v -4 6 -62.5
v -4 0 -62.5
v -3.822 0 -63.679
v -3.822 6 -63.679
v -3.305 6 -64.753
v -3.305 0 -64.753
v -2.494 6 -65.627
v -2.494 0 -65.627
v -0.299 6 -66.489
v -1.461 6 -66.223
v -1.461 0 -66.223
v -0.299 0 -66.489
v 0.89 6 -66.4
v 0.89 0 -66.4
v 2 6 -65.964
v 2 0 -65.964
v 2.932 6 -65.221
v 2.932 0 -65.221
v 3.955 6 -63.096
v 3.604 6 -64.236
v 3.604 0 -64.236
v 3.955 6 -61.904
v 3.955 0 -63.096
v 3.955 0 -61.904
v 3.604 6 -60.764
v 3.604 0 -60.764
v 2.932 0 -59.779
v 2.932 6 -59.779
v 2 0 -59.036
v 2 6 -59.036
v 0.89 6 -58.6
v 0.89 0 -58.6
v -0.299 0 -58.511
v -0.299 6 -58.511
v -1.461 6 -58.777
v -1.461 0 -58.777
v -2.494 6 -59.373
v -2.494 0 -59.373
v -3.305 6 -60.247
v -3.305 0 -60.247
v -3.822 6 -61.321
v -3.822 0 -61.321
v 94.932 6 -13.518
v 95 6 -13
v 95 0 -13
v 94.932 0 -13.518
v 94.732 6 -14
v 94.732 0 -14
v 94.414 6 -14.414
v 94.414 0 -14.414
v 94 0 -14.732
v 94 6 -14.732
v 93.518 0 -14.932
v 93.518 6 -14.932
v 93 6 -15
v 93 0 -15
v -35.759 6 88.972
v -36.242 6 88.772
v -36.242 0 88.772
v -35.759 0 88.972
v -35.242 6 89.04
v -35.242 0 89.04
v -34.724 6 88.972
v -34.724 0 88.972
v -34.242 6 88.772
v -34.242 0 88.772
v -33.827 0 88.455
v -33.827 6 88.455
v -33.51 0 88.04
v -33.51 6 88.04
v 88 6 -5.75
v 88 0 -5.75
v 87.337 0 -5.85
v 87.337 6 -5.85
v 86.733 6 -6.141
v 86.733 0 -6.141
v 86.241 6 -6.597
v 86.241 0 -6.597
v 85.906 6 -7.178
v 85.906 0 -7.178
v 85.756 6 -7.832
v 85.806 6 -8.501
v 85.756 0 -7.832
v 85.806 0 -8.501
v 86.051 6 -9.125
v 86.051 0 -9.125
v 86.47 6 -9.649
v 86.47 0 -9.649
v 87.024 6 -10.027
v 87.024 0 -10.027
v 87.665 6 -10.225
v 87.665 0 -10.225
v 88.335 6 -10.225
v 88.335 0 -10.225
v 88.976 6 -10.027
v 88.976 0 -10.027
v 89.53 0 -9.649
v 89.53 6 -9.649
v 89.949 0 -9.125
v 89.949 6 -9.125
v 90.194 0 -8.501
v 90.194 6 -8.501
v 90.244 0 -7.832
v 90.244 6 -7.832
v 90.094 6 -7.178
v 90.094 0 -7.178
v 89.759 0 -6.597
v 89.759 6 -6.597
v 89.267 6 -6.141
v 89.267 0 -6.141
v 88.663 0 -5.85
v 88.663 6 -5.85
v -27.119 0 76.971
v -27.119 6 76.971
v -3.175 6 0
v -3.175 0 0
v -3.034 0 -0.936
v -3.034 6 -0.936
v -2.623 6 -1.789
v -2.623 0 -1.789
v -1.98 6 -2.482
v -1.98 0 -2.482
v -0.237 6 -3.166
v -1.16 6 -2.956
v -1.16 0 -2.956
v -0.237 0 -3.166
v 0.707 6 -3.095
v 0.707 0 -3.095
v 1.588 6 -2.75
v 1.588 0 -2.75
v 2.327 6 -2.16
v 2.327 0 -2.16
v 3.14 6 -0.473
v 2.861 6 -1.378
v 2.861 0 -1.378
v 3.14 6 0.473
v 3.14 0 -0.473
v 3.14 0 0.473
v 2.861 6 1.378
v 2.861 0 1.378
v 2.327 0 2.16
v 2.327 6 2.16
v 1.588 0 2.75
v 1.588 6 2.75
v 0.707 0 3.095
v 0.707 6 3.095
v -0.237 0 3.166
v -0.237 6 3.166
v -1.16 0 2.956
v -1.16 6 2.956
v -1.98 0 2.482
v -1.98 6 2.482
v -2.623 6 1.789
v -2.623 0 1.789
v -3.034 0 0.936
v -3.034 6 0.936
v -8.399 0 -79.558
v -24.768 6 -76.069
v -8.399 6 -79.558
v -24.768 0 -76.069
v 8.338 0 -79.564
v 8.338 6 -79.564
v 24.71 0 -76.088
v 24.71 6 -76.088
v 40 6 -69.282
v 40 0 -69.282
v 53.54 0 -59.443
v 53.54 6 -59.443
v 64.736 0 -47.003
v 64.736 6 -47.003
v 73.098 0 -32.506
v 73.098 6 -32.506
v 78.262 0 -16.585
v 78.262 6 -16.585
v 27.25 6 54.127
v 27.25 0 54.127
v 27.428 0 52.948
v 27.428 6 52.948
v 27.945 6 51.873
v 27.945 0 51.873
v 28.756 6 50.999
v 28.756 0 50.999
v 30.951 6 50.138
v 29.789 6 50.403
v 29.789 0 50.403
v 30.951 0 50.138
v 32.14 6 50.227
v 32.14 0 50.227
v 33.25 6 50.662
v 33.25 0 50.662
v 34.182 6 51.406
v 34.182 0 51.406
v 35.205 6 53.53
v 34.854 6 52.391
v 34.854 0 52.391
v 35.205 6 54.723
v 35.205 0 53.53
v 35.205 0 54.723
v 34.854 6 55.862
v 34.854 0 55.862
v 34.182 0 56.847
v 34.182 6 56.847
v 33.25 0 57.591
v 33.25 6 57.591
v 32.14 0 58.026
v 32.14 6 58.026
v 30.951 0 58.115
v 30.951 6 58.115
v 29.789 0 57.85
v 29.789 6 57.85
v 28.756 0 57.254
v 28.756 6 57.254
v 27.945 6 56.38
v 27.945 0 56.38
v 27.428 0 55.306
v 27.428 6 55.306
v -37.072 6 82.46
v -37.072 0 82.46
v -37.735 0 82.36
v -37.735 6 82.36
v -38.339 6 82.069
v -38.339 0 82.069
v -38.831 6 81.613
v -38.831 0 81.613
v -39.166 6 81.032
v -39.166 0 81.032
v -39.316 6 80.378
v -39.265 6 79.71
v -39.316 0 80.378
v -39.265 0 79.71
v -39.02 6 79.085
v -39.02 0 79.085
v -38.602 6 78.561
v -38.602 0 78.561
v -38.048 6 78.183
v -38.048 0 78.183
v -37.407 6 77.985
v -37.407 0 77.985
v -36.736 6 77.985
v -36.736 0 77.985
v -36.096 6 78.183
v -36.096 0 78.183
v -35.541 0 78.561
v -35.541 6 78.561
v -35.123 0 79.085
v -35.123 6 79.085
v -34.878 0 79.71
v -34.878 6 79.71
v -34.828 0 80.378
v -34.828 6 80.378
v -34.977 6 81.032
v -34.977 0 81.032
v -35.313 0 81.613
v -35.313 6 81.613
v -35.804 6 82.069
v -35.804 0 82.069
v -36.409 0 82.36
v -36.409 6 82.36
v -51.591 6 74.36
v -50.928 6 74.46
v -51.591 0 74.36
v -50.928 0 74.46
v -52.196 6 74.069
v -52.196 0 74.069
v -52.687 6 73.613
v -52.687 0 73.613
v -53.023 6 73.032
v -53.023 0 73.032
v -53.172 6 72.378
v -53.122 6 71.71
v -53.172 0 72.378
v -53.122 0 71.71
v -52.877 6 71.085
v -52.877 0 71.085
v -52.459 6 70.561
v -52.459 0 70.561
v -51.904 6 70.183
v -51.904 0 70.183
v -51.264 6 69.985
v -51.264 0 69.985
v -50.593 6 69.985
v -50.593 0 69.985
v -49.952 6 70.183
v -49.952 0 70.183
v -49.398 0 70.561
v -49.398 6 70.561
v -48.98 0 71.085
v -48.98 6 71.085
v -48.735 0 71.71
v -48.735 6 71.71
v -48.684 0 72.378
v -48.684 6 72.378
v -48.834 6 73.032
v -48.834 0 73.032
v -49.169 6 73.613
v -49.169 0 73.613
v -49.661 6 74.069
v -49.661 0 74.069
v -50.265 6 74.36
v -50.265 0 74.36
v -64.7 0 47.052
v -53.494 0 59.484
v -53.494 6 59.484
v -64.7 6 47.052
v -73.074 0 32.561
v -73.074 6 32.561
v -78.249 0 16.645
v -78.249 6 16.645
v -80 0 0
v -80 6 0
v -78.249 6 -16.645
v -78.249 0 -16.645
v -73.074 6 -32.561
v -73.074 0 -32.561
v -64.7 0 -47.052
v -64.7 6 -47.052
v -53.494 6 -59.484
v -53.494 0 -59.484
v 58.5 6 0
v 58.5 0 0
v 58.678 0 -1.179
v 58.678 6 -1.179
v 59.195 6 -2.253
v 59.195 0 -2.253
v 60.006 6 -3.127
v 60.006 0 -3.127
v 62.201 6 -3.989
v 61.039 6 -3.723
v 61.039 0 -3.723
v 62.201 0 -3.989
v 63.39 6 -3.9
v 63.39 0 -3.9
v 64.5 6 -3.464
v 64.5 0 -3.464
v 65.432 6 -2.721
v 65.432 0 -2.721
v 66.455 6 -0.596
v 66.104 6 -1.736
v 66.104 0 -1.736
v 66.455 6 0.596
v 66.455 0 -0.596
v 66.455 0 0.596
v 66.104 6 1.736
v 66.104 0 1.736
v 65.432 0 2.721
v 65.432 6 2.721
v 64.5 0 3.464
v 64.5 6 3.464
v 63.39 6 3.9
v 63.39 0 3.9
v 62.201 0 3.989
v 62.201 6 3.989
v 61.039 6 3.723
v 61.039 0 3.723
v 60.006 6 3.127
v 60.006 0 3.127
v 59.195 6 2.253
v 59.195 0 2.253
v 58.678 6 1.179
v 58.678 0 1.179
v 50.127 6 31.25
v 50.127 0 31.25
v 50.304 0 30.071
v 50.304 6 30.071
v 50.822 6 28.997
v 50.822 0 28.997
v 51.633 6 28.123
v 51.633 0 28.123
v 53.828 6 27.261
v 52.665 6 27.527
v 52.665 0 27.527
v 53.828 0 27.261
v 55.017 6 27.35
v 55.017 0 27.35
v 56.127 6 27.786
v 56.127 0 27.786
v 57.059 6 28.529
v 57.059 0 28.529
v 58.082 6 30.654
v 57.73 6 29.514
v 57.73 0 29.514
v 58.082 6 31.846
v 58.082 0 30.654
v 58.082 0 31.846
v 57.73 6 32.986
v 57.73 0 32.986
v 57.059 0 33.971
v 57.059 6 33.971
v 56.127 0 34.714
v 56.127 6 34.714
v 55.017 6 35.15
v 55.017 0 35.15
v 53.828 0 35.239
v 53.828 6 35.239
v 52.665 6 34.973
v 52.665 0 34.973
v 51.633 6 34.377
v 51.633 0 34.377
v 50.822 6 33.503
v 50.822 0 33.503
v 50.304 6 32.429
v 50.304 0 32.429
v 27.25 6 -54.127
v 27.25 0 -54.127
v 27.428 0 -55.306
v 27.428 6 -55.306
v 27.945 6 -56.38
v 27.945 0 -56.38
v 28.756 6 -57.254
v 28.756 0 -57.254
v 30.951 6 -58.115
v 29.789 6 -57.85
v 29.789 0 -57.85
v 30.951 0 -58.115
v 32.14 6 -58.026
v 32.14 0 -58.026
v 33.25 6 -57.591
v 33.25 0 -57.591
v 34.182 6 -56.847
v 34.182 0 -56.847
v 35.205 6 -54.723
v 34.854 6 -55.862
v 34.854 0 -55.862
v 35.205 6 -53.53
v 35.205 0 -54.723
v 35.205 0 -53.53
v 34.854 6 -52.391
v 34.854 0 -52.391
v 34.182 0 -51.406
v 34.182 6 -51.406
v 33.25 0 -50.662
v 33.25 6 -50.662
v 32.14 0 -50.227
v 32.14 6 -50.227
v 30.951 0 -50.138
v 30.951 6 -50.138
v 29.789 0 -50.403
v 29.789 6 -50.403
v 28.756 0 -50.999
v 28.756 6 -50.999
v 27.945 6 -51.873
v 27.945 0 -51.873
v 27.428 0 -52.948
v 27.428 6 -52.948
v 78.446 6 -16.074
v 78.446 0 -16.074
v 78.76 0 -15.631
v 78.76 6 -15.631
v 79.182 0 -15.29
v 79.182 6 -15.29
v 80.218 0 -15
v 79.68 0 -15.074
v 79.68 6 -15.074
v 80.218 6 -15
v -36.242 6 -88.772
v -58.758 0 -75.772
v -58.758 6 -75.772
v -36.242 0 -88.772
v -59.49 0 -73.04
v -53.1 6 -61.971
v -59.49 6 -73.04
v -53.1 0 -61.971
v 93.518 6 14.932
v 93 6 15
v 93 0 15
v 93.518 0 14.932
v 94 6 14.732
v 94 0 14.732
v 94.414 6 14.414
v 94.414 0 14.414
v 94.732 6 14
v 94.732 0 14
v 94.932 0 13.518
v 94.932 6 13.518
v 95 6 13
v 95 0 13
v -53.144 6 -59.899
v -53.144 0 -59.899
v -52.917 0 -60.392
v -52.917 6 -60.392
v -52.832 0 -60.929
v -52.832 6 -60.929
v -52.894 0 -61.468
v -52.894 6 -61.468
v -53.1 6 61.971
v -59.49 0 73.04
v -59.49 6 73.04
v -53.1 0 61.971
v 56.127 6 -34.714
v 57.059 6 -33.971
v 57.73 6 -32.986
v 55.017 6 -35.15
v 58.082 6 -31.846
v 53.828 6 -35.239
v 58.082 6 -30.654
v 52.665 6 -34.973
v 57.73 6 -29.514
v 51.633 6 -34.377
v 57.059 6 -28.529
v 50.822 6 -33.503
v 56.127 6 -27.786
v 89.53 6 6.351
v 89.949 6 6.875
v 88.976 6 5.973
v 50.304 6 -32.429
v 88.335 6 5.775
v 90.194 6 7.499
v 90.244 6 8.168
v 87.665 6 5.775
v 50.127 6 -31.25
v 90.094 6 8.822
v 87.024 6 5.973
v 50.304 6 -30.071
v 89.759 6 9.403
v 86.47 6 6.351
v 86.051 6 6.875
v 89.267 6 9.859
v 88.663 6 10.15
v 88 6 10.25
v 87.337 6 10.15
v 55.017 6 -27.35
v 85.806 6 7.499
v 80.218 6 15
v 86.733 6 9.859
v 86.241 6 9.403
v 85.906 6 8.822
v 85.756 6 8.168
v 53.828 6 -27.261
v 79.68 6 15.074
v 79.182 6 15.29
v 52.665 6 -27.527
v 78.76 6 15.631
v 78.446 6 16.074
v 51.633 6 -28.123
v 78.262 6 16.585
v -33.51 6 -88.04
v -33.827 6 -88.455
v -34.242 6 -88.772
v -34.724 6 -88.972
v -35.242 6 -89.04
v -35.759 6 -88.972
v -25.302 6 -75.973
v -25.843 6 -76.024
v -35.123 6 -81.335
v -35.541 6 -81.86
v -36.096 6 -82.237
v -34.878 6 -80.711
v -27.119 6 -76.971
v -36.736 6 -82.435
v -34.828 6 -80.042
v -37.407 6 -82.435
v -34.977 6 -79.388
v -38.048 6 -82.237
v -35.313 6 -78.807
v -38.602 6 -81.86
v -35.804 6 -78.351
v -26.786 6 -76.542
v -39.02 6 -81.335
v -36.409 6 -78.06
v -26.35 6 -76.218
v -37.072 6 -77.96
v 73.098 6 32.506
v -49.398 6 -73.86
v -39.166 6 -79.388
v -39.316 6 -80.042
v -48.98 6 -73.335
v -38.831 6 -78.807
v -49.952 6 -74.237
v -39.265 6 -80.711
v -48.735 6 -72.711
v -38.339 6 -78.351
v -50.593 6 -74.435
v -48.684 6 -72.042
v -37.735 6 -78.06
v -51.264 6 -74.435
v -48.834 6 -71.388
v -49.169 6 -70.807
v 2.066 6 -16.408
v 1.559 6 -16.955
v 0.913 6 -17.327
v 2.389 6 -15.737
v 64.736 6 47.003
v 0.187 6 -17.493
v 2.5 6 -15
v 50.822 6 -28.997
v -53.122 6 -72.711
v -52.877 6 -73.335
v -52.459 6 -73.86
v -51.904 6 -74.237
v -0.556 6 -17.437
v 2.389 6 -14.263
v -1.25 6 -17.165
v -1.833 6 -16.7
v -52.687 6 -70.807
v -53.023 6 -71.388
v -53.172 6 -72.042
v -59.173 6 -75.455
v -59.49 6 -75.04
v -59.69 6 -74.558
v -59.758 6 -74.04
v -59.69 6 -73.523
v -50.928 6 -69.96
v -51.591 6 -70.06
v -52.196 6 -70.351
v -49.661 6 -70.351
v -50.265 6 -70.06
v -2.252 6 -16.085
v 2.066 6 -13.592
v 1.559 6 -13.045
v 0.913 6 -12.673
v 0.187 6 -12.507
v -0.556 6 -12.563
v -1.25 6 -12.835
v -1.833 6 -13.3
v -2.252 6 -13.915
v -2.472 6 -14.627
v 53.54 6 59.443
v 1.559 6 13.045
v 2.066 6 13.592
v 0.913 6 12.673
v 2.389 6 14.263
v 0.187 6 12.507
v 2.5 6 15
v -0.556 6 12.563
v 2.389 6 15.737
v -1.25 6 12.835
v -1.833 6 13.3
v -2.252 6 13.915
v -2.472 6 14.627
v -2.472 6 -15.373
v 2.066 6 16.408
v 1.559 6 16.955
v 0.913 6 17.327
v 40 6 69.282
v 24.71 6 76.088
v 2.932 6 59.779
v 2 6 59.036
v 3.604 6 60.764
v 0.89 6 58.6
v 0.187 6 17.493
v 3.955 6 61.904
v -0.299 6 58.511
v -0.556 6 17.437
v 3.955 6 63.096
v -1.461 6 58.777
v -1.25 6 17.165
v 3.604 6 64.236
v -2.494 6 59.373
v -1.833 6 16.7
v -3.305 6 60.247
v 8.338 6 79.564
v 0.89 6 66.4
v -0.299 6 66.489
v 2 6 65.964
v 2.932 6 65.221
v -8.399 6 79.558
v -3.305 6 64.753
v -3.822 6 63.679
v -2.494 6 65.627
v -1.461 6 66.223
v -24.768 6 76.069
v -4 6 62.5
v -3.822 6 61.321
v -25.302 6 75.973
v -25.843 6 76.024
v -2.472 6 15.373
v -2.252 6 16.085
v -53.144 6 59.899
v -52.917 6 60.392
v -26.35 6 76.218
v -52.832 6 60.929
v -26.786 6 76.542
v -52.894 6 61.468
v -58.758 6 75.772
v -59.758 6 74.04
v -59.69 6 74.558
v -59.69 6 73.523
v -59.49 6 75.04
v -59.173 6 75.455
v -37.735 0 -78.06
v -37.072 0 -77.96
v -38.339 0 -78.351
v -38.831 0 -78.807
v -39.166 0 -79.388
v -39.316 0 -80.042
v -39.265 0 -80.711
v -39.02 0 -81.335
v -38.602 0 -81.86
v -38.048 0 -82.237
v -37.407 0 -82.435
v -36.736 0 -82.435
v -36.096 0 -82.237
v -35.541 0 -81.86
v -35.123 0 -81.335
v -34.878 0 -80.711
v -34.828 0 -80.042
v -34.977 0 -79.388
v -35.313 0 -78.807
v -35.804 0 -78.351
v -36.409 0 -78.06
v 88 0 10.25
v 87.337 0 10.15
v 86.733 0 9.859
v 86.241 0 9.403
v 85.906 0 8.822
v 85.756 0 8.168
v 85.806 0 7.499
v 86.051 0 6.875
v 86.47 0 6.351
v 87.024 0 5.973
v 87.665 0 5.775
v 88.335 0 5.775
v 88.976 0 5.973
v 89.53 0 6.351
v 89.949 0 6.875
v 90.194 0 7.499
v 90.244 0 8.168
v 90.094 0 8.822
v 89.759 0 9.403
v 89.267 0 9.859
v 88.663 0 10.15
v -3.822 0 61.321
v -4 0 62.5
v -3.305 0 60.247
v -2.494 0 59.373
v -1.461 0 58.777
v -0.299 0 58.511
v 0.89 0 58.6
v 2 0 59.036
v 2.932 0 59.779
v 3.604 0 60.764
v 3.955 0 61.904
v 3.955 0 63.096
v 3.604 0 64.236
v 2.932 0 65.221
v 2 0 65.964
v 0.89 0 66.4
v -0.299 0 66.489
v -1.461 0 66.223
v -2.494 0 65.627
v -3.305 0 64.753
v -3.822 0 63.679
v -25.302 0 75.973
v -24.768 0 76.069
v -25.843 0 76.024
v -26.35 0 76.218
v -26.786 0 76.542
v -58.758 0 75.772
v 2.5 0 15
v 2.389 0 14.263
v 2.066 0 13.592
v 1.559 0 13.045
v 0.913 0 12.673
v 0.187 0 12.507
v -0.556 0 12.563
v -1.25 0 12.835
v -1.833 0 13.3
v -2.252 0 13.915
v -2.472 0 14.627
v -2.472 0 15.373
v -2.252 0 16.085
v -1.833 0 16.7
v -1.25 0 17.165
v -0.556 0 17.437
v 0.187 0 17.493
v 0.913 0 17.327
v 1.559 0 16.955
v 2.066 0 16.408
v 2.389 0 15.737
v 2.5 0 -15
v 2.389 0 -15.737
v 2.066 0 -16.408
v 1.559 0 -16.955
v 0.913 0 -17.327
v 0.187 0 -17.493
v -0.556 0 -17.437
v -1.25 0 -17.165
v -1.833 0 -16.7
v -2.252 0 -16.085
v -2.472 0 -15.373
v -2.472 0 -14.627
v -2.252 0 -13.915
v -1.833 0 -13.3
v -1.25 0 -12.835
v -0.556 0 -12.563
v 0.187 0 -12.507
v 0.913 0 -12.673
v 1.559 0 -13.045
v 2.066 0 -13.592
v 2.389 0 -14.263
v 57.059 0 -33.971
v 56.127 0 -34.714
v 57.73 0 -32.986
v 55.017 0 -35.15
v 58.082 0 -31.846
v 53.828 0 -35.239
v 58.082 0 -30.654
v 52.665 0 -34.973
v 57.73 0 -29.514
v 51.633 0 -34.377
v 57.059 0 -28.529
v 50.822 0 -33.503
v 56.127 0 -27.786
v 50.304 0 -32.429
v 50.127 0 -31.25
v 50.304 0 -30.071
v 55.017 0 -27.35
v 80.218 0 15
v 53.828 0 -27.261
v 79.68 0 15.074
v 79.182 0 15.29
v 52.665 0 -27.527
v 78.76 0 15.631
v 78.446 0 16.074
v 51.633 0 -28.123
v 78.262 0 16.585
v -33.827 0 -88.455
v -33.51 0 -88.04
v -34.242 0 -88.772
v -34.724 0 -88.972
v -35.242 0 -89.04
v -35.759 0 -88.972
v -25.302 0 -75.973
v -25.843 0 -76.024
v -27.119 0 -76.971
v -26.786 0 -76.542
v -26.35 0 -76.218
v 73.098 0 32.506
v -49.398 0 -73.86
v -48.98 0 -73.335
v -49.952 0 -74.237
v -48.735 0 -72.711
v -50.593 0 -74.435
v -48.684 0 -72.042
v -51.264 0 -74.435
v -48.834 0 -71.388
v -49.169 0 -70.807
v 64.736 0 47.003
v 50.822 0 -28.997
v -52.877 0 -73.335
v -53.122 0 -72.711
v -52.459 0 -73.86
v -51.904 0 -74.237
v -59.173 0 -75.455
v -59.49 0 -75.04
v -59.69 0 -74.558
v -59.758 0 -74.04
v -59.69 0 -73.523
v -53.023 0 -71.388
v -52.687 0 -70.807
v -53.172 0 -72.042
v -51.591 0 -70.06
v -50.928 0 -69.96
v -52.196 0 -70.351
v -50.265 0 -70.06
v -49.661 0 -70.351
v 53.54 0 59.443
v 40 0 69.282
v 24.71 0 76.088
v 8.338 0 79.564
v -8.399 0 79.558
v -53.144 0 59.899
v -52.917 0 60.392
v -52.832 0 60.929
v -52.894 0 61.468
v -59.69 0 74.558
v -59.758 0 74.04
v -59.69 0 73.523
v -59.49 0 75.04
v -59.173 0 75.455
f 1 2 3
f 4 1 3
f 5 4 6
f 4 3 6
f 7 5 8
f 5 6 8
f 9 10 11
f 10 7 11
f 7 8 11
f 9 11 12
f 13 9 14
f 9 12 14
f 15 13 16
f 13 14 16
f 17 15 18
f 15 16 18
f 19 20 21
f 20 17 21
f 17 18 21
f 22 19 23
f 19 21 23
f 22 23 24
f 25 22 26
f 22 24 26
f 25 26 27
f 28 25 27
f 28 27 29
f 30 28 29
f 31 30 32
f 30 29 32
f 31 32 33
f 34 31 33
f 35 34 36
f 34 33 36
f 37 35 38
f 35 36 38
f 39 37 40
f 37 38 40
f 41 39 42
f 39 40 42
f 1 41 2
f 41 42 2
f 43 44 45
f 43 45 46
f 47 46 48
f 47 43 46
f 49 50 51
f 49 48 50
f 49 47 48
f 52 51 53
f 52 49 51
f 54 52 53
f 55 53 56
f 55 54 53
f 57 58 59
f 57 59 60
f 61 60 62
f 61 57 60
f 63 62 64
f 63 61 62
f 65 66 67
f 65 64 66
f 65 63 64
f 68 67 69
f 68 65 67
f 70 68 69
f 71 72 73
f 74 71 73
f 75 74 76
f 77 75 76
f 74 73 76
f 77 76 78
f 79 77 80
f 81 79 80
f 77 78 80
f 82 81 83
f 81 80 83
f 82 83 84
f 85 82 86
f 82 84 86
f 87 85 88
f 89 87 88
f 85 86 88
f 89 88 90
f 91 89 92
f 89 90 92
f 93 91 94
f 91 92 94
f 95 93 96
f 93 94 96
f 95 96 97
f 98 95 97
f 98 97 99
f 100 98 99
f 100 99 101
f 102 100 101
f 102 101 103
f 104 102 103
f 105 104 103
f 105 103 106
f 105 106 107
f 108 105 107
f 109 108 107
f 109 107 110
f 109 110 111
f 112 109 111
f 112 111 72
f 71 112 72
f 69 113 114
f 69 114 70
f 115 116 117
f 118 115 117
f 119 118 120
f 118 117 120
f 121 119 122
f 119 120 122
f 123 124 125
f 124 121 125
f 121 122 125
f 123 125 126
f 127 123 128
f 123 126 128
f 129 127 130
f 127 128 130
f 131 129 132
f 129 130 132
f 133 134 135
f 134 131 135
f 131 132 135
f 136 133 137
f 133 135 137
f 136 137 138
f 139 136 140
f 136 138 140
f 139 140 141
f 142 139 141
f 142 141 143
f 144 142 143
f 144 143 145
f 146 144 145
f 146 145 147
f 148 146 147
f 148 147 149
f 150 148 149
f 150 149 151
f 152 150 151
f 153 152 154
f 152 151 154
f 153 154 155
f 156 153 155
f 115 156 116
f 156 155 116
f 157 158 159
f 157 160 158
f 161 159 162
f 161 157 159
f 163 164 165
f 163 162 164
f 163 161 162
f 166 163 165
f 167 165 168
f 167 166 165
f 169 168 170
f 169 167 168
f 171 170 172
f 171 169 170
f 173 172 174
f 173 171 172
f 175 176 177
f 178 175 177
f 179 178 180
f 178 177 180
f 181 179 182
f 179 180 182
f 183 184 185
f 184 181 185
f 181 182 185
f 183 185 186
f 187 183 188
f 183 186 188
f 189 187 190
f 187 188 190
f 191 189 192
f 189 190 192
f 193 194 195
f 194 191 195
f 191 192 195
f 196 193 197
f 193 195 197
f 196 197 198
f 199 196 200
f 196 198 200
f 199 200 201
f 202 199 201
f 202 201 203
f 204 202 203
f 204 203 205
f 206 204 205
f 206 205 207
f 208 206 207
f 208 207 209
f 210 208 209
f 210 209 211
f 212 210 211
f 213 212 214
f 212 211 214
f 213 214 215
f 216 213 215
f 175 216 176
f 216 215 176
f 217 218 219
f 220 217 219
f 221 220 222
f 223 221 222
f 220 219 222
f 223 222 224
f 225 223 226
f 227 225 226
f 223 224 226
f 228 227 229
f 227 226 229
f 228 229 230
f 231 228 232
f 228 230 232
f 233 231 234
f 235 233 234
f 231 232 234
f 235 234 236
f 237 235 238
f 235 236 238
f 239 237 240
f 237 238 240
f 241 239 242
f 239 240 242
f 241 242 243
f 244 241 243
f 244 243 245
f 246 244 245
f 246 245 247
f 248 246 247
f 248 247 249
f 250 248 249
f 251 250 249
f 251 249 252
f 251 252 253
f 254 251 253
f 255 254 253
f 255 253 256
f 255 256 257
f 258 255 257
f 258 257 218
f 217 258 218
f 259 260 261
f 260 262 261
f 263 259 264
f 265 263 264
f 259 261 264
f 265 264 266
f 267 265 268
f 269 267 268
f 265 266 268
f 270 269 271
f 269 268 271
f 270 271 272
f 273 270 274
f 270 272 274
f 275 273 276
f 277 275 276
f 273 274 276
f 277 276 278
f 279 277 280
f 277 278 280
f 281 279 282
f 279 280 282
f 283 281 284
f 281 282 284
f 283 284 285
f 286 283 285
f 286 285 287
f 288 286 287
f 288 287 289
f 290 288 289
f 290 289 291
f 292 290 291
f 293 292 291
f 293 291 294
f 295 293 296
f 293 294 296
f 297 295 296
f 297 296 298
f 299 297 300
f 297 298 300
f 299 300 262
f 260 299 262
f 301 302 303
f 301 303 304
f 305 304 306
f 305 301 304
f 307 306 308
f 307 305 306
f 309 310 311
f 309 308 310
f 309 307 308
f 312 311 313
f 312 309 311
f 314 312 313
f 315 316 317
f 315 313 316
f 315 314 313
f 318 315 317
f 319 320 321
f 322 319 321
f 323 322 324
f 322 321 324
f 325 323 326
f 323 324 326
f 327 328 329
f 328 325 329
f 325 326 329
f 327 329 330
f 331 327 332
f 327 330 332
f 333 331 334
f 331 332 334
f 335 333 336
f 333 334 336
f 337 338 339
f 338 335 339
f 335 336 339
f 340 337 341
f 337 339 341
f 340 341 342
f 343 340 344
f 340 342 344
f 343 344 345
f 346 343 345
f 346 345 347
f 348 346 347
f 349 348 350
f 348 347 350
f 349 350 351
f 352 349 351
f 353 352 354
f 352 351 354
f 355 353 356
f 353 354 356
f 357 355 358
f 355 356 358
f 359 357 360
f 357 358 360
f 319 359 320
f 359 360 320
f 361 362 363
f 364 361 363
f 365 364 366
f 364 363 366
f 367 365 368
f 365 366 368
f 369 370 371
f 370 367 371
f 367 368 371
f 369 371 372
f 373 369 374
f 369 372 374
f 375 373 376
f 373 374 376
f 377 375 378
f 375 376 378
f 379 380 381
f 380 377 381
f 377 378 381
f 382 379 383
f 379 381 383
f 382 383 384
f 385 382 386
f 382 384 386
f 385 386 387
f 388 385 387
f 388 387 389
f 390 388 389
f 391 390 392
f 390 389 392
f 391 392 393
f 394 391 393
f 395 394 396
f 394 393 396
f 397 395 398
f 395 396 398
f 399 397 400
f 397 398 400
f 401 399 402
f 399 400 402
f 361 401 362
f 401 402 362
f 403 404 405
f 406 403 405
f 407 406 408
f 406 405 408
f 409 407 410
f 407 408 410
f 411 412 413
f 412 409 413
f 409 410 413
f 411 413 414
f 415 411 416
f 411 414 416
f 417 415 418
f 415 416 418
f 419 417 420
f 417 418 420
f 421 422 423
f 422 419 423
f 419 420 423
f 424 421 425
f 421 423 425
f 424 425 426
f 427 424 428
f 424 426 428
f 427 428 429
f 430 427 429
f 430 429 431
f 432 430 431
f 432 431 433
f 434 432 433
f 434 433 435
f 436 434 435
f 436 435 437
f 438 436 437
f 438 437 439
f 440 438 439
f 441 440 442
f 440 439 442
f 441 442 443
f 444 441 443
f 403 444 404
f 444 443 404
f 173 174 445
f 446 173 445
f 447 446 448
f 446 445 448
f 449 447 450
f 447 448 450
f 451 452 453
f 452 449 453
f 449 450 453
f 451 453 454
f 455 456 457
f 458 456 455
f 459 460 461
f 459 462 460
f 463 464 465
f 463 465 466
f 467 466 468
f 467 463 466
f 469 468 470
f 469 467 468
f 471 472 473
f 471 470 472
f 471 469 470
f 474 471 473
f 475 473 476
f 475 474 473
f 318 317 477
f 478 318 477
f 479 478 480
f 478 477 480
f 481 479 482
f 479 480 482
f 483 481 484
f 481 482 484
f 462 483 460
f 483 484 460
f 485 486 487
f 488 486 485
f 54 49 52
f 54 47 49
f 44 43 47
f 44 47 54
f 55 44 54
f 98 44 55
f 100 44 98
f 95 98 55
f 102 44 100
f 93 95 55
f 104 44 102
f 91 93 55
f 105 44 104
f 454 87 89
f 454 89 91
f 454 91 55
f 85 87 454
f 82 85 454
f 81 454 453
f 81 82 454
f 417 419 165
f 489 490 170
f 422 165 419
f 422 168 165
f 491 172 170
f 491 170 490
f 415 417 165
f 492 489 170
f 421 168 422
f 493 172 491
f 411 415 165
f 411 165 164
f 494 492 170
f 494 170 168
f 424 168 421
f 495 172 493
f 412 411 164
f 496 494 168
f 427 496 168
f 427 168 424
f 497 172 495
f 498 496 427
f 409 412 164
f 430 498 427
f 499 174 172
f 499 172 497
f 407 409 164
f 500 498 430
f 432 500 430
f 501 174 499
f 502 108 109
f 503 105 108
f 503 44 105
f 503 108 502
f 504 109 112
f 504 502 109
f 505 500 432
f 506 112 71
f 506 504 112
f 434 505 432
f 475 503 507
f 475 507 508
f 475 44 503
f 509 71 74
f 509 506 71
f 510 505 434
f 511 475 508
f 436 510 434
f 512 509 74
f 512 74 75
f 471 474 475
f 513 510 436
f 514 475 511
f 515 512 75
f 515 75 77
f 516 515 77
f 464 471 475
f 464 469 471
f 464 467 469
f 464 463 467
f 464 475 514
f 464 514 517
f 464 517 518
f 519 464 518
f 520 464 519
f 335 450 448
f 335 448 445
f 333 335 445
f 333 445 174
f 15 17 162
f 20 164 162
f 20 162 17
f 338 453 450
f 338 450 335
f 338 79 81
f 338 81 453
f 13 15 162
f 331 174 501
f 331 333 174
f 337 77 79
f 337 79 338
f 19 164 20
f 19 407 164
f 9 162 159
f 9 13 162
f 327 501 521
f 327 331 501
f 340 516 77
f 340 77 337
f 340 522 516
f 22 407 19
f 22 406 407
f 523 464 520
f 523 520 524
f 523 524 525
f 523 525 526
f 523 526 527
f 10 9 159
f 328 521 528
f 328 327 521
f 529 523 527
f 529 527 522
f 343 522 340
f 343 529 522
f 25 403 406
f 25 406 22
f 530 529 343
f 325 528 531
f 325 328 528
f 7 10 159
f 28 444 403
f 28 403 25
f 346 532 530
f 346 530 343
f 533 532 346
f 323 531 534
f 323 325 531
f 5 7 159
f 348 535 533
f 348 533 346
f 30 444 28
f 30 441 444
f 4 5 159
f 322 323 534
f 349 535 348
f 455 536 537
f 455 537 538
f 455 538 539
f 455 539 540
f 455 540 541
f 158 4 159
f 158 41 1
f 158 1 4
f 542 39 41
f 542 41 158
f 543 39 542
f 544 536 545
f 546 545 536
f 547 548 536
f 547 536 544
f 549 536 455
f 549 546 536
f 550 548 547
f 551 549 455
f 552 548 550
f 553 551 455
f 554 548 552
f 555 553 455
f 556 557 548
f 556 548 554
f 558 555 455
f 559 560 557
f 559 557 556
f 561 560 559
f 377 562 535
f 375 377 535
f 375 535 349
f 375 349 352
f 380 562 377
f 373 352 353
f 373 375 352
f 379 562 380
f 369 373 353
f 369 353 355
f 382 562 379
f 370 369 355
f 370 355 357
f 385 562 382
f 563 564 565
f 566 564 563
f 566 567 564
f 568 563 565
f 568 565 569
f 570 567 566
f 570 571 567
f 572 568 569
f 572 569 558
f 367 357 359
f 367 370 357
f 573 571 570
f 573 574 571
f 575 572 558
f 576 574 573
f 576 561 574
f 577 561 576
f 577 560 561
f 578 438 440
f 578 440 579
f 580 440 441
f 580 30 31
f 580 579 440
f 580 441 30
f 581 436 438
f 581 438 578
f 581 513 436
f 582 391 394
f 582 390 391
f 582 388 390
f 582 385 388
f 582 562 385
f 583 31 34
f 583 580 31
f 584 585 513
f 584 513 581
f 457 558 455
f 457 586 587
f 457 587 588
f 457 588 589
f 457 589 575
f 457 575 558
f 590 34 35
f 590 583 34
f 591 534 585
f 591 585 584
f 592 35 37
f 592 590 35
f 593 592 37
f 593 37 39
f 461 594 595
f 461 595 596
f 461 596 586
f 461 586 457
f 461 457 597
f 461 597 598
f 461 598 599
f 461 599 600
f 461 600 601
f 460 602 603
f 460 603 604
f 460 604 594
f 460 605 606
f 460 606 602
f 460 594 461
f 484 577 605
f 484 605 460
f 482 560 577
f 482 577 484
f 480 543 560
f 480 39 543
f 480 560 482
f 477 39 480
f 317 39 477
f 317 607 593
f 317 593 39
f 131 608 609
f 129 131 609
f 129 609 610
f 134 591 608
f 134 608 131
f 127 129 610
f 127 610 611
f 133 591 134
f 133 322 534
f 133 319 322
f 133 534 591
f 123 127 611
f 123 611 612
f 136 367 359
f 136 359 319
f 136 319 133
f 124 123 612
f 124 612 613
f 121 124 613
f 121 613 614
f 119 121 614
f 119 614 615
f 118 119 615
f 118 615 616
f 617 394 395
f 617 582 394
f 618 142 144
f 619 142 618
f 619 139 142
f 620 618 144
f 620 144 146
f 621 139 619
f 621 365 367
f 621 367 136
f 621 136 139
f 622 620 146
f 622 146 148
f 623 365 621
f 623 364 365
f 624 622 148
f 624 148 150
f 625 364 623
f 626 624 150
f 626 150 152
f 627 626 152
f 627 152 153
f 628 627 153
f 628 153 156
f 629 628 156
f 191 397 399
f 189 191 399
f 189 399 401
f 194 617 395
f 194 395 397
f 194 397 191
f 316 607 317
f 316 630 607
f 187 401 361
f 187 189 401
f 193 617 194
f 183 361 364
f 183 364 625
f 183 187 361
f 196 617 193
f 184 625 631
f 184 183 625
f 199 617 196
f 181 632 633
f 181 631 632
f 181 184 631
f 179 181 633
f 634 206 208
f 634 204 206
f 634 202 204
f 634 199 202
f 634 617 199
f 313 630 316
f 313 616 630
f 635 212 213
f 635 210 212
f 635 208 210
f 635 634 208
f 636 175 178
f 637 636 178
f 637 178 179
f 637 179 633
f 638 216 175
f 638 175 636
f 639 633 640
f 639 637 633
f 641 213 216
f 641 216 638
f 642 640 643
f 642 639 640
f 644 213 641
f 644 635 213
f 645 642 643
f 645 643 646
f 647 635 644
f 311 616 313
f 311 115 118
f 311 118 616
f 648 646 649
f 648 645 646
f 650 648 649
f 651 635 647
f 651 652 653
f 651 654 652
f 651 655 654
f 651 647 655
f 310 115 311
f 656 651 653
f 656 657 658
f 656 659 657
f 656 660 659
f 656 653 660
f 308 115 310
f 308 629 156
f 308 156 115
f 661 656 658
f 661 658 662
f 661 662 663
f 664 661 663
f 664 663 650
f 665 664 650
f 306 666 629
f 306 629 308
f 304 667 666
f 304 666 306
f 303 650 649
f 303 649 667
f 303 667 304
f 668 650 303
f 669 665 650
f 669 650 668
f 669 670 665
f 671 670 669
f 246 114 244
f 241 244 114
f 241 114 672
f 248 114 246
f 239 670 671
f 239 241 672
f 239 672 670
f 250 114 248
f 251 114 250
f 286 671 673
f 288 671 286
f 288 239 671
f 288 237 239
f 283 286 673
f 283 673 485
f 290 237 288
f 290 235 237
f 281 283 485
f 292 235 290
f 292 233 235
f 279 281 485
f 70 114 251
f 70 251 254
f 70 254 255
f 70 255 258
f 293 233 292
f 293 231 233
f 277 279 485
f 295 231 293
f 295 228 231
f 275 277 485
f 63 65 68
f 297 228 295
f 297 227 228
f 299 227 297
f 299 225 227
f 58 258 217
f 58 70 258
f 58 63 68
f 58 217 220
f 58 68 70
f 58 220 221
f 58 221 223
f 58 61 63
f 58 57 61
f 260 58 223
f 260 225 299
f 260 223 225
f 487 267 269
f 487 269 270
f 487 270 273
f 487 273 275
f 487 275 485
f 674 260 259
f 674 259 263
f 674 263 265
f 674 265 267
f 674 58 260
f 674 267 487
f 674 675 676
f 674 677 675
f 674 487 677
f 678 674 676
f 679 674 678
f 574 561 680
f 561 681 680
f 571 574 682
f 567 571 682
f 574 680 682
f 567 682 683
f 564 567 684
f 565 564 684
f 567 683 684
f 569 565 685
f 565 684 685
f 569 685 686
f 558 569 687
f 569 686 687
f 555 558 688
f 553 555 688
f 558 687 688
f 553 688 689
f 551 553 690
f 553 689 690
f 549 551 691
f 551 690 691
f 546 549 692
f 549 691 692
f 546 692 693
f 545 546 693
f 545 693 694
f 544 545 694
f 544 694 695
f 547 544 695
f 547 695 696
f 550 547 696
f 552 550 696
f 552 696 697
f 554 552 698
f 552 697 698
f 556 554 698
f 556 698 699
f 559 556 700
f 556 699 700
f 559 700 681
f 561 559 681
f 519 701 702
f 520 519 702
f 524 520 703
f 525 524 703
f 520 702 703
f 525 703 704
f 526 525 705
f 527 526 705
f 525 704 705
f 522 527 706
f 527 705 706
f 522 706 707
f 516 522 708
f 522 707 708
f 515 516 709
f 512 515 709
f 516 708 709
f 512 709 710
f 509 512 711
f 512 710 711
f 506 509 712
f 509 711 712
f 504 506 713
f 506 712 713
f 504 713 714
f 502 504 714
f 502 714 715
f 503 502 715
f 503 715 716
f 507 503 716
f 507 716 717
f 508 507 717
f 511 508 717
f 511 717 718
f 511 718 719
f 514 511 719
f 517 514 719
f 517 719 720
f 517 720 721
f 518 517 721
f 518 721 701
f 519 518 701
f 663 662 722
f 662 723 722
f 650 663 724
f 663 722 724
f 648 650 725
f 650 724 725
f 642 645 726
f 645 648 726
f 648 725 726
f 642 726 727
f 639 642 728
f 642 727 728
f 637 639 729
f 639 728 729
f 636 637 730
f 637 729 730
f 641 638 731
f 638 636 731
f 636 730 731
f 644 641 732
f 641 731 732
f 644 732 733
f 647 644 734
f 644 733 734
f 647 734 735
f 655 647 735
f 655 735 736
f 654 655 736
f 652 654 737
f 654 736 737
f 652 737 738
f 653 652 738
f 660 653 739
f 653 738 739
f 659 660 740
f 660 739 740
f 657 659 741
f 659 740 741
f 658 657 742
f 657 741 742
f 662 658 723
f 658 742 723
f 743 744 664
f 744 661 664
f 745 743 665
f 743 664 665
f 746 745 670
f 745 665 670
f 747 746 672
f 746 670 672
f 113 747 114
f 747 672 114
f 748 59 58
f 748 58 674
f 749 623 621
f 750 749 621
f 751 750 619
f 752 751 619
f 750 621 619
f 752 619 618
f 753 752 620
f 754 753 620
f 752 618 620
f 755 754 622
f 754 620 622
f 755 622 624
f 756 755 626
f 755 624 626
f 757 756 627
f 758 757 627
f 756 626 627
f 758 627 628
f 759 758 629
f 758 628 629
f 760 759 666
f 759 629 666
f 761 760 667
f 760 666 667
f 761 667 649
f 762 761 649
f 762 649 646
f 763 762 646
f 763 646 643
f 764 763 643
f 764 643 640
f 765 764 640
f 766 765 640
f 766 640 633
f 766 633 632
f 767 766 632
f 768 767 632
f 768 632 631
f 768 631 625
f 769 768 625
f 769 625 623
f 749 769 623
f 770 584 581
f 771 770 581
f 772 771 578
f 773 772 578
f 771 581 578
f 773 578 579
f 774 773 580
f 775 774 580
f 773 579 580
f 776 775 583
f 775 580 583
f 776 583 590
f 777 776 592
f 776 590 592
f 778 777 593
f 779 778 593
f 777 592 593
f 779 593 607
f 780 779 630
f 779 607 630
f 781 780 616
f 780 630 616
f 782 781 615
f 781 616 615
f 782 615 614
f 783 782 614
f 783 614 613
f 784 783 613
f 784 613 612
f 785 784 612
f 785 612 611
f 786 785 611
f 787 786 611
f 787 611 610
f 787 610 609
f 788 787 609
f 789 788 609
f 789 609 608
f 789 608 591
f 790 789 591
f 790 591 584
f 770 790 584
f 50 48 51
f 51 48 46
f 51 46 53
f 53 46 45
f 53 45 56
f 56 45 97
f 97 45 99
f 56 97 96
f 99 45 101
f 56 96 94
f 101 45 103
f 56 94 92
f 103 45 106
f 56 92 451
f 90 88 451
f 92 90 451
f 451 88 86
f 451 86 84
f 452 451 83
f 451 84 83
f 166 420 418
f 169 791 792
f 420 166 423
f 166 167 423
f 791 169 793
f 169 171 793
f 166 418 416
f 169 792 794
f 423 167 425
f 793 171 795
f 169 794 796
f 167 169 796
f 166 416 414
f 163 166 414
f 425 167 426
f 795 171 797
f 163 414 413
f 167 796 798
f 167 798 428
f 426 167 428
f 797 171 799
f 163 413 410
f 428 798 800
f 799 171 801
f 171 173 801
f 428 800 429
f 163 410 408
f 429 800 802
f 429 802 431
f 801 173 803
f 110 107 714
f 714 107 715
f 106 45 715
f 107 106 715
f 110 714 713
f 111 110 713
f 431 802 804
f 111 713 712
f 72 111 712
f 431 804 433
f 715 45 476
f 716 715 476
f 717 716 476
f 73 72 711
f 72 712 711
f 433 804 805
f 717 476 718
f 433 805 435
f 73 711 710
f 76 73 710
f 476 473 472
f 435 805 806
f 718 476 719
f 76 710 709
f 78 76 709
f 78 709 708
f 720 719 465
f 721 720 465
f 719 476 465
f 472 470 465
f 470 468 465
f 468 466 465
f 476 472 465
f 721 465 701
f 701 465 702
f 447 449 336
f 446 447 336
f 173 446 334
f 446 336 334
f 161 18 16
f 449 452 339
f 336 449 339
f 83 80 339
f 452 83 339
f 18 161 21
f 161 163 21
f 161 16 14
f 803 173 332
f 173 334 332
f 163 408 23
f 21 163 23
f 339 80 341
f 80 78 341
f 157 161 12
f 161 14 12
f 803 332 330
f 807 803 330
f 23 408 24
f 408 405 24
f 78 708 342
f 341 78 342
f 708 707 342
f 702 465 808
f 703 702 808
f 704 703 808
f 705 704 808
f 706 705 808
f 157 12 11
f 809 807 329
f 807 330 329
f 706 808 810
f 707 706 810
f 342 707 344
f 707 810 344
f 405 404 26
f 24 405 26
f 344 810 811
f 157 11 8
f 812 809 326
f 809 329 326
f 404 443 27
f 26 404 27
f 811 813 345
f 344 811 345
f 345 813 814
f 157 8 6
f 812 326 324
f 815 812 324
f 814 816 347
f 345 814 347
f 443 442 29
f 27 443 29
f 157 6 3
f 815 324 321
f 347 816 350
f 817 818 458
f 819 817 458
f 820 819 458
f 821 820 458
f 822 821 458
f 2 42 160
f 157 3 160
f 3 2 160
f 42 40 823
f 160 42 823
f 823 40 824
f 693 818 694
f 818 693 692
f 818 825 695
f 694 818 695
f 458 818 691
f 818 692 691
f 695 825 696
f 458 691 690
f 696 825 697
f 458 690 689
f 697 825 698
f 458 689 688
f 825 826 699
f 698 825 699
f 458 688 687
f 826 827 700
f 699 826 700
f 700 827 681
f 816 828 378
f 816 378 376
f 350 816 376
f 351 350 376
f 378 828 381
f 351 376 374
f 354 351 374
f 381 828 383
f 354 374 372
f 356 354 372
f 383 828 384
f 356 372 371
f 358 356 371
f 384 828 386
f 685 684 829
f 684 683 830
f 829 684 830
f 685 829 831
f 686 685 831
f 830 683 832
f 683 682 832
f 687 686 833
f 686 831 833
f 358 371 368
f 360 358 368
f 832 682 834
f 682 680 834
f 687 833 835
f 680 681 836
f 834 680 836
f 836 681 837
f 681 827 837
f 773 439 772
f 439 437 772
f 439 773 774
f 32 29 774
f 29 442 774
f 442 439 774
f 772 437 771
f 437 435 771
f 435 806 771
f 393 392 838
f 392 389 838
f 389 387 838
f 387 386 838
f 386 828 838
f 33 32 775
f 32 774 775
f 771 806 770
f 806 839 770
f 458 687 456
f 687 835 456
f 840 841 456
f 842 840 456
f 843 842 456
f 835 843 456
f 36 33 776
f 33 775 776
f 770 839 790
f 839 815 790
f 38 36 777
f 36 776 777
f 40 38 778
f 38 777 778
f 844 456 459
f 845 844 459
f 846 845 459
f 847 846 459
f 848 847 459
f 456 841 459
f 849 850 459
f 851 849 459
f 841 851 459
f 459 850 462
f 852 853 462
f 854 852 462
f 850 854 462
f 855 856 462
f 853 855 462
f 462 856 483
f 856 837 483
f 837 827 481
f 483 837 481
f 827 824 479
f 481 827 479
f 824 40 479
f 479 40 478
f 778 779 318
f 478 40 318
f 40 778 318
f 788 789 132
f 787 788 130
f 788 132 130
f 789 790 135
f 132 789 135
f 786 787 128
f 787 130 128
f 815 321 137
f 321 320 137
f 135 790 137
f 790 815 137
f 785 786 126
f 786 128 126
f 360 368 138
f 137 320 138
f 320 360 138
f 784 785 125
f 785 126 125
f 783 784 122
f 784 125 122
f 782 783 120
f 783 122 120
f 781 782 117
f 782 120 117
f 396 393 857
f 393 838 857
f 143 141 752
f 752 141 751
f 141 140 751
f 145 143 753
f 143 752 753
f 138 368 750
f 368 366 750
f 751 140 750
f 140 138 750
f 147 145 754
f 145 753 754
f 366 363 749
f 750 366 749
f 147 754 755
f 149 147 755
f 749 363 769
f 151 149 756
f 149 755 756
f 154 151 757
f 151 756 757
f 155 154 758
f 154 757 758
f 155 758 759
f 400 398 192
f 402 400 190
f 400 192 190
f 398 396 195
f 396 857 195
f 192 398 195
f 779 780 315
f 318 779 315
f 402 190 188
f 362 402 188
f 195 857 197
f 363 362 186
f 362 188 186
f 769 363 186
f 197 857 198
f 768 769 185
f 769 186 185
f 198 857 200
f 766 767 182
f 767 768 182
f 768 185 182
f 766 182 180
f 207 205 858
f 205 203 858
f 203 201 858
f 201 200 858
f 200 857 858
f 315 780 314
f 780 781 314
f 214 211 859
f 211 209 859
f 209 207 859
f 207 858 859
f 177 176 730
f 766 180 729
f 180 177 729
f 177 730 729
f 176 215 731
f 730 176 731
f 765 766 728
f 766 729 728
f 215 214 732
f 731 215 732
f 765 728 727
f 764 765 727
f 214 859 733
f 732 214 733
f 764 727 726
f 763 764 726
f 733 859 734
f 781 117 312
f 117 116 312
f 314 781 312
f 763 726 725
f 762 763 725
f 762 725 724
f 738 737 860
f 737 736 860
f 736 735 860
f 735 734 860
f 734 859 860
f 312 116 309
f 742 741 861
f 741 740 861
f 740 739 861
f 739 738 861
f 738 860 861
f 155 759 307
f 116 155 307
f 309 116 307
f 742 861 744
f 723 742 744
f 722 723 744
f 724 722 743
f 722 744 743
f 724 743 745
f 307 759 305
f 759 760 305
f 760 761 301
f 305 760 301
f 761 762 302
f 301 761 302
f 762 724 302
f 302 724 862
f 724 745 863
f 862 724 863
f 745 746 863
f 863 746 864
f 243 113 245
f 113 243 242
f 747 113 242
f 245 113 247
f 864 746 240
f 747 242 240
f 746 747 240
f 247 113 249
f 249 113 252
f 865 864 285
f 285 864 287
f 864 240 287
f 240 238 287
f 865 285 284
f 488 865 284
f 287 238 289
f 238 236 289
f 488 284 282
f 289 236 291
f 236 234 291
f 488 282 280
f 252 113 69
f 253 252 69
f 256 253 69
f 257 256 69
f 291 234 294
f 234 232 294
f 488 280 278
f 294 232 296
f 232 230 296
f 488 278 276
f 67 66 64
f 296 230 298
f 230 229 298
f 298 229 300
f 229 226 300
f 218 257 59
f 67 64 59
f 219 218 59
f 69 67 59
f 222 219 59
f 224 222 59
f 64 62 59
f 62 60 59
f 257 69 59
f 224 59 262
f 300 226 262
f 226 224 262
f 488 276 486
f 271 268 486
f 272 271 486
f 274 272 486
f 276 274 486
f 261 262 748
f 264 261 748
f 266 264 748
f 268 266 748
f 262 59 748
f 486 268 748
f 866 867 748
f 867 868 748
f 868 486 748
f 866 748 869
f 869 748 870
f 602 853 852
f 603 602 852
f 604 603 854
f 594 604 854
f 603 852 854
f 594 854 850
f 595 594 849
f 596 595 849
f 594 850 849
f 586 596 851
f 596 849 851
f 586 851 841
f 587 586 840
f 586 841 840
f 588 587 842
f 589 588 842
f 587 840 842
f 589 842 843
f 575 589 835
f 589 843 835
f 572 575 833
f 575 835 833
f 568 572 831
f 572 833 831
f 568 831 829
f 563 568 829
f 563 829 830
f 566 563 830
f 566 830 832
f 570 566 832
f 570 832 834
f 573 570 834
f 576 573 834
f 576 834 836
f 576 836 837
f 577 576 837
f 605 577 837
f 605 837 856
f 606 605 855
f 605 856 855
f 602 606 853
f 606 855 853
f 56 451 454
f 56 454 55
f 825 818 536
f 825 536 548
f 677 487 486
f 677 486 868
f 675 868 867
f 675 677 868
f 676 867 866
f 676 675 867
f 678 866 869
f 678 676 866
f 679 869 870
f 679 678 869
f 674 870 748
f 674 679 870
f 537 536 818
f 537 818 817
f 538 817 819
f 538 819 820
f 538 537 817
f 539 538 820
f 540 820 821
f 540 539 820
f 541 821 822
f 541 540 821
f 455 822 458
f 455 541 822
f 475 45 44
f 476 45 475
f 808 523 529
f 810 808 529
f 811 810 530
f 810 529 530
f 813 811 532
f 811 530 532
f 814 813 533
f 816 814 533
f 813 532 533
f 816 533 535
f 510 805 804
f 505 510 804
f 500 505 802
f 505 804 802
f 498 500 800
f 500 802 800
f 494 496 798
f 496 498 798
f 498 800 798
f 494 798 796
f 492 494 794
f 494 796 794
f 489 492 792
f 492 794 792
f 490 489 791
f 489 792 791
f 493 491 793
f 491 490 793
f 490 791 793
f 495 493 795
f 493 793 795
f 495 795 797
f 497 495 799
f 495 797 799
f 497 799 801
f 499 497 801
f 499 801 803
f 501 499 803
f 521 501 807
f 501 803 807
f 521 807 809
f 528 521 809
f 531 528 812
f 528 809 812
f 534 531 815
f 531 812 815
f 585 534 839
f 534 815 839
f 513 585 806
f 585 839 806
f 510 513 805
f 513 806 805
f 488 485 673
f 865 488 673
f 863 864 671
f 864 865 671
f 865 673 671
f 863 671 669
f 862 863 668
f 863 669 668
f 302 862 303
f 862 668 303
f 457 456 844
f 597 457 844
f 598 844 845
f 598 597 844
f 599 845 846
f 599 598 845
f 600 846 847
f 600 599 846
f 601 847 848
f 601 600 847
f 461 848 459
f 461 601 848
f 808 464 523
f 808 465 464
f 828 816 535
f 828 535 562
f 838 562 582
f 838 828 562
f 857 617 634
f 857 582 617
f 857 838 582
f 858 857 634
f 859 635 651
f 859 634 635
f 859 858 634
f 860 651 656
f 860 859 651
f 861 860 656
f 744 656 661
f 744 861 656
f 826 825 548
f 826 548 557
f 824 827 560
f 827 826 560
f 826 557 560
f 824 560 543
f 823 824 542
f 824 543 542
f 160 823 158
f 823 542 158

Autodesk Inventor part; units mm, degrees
ref_plane "YZ Plane" through (0, 0, 0) normal (1, 0, 0) x (0, 1, 0)
ref_plane "XZ Plane" through (0, 0, 0) normal (0, 1, 0) x (-1, 0, 0)
ref_plane "XY Plane" through (0, 0, 0) normal (0, 0, 1) x (1, 0, 0)
sketch "Sketch1" plane through (0, 0, 0) normal (0, 1, 0) x (-1, 0, 0)
  line L0 (0, 80) -> (0, 62.5) construction
  circle A0 centre (0, 62.5) radius 4
  line L1 (0, 62.5) -> (0, 0) construction
  circle A1 centre (-31.25, 54.1266) radius 4
  circle A2 centre (-54.1266, 31.25) radius 4
  circle A3 centre (-62.5, 0) radius 4
  circle A4 centre (-54.1266, -31.25) radius 4
  circle A5 centre (-31.25, -54.1266) radius 4
  circle A6 centre (0, -62.5) radius 4
  circle A7 centre (0, 0) radius 3.175
  line L2 (-78.5812, -15) -> (-95, -15)
  line L3 (-95, -15) -> (-95, 15)
  line L4 (-95, 15) -> (-78.5812, 15)
  line L5 (52.281, -60.5533) -> (60.4904, -74.7724)
  line L6 (60.4904, -74.7724) -> (34.5096, -89.7724)
  line L7 (34.5096, -89.7724) -> (26.3002, -75.5533)
  line L8 (26.3002, 75.5533) -> (34.5096, 89.7724)
  line L9 (34.5096, 89.7724) -> (60.4904, 74.7724)
  line L10 (60.4904, 74.7724) -> (52.281, 60.5533)
  arc A8 (52.281, -60.5533) -> (52.281, 60.5533) centre (0, 0) ccw
  arc A9 (26.3002, 75.5533) -> (-78.5812, 15) centre (0, 0) ccw
  arc A10 (-78.5812, -15) -> (26.3002, -75.5533) centre (0, 0) ccw
  point P0 (80, 0)
  dimension "d2" = 8
  dimension "d5" = 180
  dimension "d7" = 6.35
  dimension "d10" = 62.5
  dimension "d12" = 95
  dimension "d13" = 30
  dimension "d16" = 360
  dimension "d18" = 80
extrude "Extrusion1" add sketch "Sketch1" along normal blind 6
sketch "Sketch3" plane through (0, 6, 0) normal (0, 1, 0) x (1, 0, 0)
  line L0 (95, 15) -> (78.5812, 15) projected
  line L1 (78.5812, -15) -> (95, -15) projected
  line L2 (95, -15) -> (95, 15) projected
  point P0 (0, 0)
  point P1 (88, 8)
  point P2 (88, -8)
  point P3 (86.7906, -15)
  point P4 (-50.9282, 72.2102)
  point P5 (-37.0718, 80.2102)
  point P6 (-37.0718, -80.2102)
  point P7 (-50.9282, -72.2102)
  dimension "d19" = 7
  dimension "d20" = 7
  dimension "d21" = 7
  dimension "d24" = 360
hole "Hole1" at (88, 6, -8) at (88, 6, 8) at (-50.9282, 6, -72.2102) at (-37.0718, 6, -80.2102) at (-37.0718, 6, 80.2102) at (-50.9282, 6, 72.2102) direction (0, -1, 0) diameter 4.5 end through all clearance for "Flat Head Machine Screw" size "M4" standard "Ansi Metric M Profile"
sketch "Sketch4" plane through (0, 6, 0) normal (0, 1, 0) x (1, 0, 0)
  circle A0 centre (0, 15) radius 2.5
  circle A1 centre (0, -15) radius 2.5
  circle A2 centre (0, 0) radius 3.175 construction
  line L0 (0, 0) -> (8.7984, 0) construction
  dimension "d33" = 5
  dimension "d34" = 15
extrude "Extrusion2" cut sketch "Sketch4" against normal blind 6
fillet "Fillet1" radius 2 12 edges at (-52.281, 3, 60.5533) (-60.4904, 3, 74.7724) (-34.5096, 3, 89.7724) (-26.3002, 3, 75.5533) (78.5812, 3, 15) (95, 3, 15) (95, 3, -15) (78.5812, 3, -15) (-26.3002, 3, -75.5533) (-34.5096, 3, -89.7724) (-52.281, 3, -60.5533) (-60.4904, 3, -74.7724)
properties part number "SkimmerLid"
